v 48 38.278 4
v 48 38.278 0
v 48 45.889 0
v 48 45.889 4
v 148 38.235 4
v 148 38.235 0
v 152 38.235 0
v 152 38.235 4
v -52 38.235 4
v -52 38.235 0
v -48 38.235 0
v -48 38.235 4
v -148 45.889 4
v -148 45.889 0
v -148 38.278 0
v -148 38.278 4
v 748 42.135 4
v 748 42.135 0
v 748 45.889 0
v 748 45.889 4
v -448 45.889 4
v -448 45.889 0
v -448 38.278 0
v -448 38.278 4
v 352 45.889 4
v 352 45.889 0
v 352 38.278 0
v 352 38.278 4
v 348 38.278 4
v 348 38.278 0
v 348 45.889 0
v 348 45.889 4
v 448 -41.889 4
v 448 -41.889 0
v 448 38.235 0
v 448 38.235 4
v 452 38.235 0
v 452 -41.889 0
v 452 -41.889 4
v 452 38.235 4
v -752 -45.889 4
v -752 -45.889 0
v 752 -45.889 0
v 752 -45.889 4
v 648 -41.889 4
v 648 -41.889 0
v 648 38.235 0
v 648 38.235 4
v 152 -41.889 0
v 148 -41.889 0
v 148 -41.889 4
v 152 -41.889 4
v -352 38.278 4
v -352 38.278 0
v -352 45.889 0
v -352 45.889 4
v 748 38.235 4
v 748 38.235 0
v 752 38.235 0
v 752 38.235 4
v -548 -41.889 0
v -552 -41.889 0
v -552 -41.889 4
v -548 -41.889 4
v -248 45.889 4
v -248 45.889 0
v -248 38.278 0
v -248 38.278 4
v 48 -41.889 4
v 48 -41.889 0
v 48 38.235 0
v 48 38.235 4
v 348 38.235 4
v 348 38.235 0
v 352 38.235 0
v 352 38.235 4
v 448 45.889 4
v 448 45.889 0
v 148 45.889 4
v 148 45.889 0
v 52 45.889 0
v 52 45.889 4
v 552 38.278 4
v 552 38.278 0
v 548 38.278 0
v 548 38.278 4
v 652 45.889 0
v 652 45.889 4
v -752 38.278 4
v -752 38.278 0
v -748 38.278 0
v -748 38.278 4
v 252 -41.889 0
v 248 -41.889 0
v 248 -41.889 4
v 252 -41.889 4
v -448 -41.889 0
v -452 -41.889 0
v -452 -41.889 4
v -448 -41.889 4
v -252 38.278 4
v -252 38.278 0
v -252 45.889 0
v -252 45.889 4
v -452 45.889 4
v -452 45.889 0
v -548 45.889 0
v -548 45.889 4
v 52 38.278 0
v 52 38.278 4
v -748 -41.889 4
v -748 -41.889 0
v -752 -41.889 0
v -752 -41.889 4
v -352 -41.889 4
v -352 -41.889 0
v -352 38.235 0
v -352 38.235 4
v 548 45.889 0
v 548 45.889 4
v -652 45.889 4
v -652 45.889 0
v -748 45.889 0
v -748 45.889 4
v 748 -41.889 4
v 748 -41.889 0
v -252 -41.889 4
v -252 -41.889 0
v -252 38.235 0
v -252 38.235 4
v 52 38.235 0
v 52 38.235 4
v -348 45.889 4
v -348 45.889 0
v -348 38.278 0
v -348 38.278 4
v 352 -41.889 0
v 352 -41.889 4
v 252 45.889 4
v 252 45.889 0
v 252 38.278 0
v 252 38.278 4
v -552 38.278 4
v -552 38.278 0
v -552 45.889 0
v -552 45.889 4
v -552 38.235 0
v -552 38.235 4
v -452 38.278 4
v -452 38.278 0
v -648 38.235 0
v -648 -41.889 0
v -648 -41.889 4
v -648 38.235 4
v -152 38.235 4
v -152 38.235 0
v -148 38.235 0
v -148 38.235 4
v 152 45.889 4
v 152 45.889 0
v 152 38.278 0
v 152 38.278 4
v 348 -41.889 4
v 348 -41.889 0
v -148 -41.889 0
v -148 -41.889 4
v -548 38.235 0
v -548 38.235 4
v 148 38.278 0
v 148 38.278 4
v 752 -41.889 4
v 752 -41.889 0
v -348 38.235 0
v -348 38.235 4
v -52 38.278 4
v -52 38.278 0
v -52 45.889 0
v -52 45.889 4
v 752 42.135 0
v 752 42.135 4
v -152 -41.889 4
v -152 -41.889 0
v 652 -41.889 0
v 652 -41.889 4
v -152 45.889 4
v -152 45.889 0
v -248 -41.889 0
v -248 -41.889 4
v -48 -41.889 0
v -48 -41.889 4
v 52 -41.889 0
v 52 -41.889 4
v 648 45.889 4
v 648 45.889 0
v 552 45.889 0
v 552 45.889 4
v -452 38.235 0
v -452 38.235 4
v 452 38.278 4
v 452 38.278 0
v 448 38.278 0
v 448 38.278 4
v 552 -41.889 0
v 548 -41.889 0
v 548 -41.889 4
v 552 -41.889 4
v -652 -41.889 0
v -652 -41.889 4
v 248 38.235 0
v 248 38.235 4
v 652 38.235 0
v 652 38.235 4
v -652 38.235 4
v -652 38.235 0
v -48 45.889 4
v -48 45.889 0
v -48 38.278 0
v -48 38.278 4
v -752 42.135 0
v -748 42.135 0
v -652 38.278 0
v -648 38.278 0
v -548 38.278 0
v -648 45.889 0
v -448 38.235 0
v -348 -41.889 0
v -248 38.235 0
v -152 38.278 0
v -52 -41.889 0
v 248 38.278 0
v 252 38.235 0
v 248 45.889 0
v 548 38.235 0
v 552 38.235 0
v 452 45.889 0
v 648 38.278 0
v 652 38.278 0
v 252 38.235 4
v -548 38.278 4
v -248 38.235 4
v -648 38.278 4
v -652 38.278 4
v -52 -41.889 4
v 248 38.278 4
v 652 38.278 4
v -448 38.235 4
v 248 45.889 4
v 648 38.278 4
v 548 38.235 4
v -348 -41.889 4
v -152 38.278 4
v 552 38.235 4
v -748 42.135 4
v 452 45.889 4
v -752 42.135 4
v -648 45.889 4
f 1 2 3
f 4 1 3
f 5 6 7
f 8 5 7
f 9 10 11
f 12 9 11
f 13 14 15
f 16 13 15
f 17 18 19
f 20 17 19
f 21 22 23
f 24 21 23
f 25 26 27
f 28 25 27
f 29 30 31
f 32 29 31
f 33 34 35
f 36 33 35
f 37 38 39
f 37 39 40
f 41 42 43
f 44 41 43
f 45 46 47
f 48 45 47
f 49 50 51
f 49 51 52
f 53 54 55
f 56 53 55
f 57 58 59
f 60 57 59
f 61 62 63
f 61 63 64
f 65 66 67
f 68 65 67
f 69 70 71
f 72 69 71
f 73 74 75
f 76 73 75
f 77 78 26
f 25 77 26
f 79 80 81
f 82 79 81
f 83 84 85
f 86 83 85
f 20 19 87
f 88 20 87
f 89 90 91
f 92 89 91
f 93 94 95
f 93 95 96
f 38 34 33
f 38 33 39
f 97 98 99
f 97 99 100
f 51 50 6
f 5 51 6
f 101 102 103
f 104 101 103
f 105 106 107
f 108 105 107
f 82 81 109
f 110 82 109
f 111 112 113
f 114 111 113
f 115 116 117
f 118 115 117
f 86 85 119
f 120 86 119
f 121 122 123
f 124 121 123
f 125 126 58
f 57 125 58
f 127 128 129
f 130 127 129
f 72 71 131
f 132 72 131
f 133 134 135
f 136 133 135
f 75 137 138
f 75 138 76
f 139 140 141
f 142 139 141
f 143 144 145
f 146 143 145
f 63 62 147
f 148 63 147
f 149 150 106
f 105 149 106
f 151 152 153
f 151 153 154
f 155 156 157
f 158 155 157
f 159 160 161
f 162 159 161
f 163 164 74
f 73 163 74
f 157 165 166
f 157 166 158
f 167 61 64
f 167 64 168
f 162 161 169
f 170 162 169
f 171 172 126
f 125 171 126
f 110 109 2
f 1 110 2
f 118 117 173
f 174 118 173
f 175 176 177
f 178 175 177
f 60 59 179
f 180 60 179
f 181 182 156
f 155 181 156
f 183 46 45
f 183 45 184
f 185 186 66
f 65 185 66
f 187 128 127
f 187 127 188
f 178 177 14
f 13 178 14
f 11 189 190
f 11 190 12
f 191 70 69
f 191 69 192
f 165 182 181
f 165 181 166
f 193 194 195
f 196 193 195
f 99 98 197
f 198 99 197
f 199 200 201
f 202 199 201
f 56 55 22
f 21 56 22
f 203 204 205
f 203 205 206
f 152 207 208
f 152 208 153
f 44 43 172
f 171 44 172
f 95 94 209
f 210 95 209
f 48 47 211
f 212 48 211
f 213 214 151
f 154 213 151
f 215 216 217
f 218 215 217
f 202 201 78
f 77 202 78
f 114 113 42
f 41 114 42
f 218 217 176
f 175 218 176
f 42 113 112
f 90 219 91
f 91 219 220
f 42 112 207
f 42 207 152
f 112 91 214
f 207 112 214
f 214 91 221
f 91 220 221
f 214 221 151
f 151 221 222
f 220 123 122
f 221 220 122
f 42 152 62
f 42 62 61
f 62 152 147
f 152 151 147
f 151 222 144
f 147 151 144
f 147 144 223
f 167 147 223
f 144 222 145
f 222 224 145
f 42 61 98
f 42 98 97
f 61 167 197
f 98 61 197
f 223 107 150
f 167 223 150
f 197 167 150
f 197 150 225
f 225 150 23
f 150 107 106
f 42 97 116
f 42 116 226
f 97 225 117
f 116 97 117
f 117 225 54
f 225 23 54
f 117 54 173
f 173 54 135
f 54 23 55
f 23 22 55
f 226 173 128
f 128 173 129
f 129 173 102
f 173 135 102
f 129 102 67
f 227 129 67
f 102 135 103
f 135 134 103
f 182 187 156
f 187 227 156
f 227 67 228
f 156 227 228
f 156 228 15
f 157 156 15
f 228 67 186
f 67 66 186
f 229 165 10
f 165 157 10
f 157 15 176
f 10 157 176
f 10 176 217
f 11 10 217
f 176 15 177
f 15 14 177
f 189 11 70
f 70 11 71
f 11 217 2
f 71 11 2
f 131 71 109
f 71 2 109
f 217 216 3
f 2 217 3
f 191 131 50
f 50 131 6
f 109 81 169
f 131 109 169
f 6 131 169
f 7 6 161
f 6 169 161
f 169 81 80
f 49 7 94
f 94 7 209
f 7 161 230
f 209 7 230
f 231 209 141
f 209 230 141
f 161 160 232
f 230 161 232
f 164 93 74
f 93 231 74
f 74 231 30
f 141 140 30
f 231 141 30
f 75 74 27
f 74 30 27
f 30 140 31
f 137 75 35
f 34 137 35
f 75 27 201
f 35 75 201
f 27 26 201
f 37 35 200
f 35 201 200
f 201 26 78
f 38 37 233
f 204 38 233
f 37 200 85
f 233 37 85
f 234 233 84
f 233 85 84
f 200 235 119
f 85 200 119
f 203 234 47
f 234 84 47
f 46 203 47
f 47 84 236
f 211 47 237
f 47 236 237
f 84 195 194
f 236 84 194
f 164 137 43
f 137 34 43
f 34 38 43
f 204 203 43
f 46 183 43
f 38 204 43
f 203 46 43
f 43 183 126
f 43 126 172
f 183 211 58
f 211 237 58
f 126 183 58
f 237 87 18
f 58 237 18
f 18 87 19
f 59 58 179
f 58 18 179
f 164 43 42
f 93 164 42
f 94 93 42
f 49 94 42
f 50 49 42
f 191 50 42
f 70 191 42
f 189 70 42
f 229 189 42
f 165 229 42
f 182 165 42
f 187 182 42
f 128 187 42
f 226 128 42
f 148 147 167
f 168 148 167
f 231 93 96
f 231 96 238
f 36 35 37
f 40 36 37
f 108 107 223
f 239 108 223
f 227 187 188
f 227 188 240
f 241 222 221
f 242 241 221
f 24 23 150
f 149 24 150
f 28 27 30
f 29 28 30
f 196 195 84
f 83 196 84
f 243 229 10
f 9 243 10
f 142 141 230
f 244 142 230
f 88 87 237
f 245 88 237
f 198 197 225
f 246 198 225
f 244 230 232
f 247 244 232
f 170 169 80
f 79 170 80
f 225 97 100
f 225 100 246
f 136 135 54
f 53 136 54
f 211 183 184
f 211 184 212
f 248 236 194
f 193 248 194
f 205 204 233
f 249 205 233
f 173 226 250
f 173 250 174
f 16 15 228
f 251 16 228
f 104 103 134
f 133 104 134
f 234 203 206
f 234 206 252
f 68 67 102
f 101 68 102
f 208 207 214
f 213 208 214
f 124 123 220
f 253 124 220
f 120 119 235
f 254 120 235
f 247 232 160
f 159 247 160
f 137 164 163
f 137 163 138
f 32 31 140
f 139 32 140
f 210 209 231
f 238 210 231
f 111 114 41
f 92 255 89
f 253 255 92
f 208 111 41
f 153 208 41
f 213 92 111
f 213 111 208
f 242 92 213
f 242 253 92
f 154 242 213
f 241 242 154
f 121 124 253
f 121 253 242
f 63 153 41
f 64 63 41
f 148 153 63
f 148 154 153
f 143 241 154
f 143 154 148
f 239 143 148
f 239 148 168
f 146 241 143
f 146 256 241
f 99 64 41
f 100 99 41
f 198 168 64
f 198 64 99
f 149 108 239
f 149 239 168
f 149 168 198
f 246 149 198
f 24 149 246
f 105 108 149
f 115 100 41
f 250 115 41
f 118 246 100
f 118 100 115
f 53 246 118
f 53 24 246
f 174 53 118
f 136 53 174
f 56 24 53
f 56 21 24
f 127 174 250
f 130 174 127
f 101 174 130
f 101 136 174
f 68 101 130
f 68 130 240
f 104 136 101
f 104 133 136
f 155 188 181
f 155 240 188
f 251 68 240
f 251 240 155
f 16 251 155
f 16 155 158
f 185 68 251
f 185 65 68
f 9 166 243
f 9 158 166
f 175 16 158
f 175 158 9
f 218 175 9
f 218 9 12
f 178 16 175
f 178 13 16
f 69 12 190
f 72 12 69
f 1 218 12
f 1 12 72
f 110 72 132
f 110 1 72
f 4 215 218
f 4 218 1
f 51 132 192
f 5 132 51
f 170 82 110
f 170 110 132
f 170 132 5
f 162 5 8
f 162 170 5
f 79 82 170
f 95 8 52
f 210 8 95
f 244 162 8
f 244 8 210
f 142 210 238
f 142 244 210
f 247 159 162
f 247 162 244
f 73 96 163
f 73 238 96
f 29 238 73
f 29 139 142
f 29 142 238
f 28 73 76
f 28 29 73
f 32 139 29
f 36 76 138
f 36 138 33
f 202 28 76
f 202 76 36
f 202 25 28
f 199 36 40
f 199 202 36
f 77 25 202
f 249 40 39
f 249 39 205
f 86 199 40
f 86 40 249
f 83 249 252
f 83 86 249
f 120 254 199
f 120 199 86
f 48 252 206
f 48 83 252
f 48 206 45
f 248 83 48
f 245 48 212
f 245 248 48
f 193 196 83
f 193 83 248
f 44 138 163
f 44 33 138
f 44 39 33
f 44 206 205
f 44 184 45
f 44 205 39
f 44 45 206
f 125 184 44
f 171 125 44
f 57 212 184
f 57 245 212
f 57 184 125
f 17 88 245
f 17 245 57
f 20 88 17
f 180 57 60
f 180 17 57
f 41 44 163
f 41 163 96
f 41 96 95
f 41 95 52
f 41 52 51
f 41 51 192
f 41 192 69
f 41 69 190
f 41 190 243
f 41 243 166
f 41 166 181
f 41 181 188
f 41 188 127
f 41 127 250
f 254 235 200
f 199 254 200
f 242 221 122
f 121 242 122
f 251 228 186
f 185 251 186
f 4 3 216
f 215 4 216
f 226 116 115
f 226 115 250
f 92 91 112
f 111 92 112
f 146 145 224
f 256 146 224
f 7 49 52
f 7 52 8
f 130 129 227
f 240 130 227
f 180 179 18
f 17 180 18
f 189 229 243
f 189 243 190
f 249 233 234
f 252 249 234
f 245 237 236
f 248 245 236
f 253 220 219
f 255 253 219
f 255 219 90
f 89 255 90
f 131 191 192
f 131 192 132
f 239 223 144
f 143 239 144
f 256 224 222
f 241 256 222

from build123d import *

# Parameters (mm, degrees)
SKETCH1_W           = 4
SKETCH1_H           = 80.123518492
BOSS_EXTRUDE1_DEPTH = 4


with BuildPart() as part:
    # Sketch1 → Boss-Extrude1 (new body)
    with BuildSketch(Plane.XY):
        Polygon((-652, 45.888948558), (-748, 45.888948558), (-748, 42.134569934), (-752, 42.134569934), (-752, 38.278329491), (-748, 38.278329491), (-748, -41.888948558), (-752, -41.888948558), (-752, -45.888948558), (752, -45.888948558), (752, -41.888948558), (748, -41.888948558), (748, 38.234569934), (752, 38.234569934), (752, 42.134569934), (748, 42.134569934), (748, 45.888948558), (652, 45.888948558), (652, 42.134569934), (652, 38.278329491), (648, 38.278329491), (648, 42.134569934), (648, 45.888948558), (552, 45.888948558), (552, 42.134569934), (552, 38.278329491), (548, 38.278329491), (548, 42.134569934), (548, 45.888948558), (452, 45.888948558), (452, 42.134569934), (452, 38.278329491), (448, 38.278329491), (448, 42.134569934), (448, 45.888948558), (352, 45.888948558), (352, 42.134569934), (352, 38.278329491), (348, 38.278329491), (348, 42.134569934), (348, 45.888948558), (252, 45.888948558), (252, 42.134569934), (252, 38.278329491), (248, 38.278329491), (248, 42.134569934), (248, 45.888948558), (152, 45.888948558), (152, 42.134569934), (152, 38.278329491), (148, 38.278329491), (148, 42.134569934), (148, 45.888948558), (52, 45.888948558), (52, 42.134569934), (52, 38.278329491), (48, 38.278329491), (48, 42.134569934), (48, 45.888948558), (-48, 45.888948558), (-48, 42.134569934), (-48, 38.278329491), (-52, 38.278329491), (-52, 42.134569934), (-52, 45.888948558), (-148, 45.888948558), (-148, 42.134569934), (-148, 38.278329491), (-152, 38.278329491), (-152, 42.134569934), (-152, 45.888948558), (-248, 45.888948558), (-248, 42.134569934), (-248, 38.278329491), (-252, 38.278329491), (-252, 42.134569934), (-252, 45.888948558), (-348, 45.888948558), (-348, 42.134569934), (-348, 38.278329491), (-352, 38.278329491), (-352, 42.134569934), (-352, 45.888948558), (-448, 45.888948558), (-448, 42.134569934), (-448, 38.278329491), (-452, 38.278329491), (-452, 42.134569934), (-452, 45.888948558), (-548, 45.888948558), (-548, 42.134569934), (-548, 38.278329491), (-552, 38.278329491), (-552, 42.134569934), (-552, 45.888948558), (-648, 45.888948558), (-648, 42.134569934), (-648, 38.278329491), (-652, 38.278329491), (-652, 42.134569934), align=None)
        with Locations((-650, -1.827189312)):
            Rectangle(SKETCH1_W, SKETCH1_H, mode=Mode.SUBTRACT)
        with Locations((-550, -1.827189312)):
            Rectangle(SKETCH1_W, SKETCH1_H, mode=Mode.SUBTRACT)
        with Locations((-450, -1.827189312)):
            Rectangle(SKETCH1_W, SKETCH1_H, mode=Mode.SUBTRACT)
        with Locations((-350, -1.827189312)):
            Rectangle(SKETCH1_W, SKETCH1_H, mode=Mode.SUBTRACT)
        with Locations((-250, -1.827189312)):
            Rectangle(SKETCH1_W, SKETCH1_H, mode=Mode.SUBTRACT)
        with Locations((-150, -1.827189312)):
            Rectangle(SKETCH1_W, SKETCH1_H, mode=Mode.SUBTRACT)
        with Locations((-50, -1.827189312)):
            Rectangle(SKETCH1_W, SKETCH1_H, mode=Mode.SUBTRACT)
        with Locations((50, -1.827189312)):
            Rectangle(SKETCH1_W, SKETCH1_H, mode=Mode.SUBTRACT)
        with Locations((150, -1.827189312)):
            Rectangle(SKETCH1_W, SKETCH1_H, mode=Mode.SUBTRACT)
        with Locations((250, -1.827189312)):
            Rectangle(SKETCH1_W, SKETCH1_H, mode=Mode.SUBTRACT)
        with Locations((350, -1.827189312)):
            Rectangle(SKETCH1_W, SKETCH1_H, mode=Mode.SUBTRACT)
        with Locations((450, -1.827189312)):
            Rectangle(SKETCH1_W, SKETCH1_H, mode=Mode.SUBTRACT)
        with Locations((550, -1.827189312)):
            Rectangle(SKETCH1_W, SKETCH1_H, mode=Mode.SUBTRACT)
        with Locations((650, -1.827189312)):
            Rectangle(SKETCH1_W, SKETCH1_H, mode=Mode.SUBTRACT)
    extrude(amount=BOSS_EXTRUDE1_DEPTH)


solid = part.part
